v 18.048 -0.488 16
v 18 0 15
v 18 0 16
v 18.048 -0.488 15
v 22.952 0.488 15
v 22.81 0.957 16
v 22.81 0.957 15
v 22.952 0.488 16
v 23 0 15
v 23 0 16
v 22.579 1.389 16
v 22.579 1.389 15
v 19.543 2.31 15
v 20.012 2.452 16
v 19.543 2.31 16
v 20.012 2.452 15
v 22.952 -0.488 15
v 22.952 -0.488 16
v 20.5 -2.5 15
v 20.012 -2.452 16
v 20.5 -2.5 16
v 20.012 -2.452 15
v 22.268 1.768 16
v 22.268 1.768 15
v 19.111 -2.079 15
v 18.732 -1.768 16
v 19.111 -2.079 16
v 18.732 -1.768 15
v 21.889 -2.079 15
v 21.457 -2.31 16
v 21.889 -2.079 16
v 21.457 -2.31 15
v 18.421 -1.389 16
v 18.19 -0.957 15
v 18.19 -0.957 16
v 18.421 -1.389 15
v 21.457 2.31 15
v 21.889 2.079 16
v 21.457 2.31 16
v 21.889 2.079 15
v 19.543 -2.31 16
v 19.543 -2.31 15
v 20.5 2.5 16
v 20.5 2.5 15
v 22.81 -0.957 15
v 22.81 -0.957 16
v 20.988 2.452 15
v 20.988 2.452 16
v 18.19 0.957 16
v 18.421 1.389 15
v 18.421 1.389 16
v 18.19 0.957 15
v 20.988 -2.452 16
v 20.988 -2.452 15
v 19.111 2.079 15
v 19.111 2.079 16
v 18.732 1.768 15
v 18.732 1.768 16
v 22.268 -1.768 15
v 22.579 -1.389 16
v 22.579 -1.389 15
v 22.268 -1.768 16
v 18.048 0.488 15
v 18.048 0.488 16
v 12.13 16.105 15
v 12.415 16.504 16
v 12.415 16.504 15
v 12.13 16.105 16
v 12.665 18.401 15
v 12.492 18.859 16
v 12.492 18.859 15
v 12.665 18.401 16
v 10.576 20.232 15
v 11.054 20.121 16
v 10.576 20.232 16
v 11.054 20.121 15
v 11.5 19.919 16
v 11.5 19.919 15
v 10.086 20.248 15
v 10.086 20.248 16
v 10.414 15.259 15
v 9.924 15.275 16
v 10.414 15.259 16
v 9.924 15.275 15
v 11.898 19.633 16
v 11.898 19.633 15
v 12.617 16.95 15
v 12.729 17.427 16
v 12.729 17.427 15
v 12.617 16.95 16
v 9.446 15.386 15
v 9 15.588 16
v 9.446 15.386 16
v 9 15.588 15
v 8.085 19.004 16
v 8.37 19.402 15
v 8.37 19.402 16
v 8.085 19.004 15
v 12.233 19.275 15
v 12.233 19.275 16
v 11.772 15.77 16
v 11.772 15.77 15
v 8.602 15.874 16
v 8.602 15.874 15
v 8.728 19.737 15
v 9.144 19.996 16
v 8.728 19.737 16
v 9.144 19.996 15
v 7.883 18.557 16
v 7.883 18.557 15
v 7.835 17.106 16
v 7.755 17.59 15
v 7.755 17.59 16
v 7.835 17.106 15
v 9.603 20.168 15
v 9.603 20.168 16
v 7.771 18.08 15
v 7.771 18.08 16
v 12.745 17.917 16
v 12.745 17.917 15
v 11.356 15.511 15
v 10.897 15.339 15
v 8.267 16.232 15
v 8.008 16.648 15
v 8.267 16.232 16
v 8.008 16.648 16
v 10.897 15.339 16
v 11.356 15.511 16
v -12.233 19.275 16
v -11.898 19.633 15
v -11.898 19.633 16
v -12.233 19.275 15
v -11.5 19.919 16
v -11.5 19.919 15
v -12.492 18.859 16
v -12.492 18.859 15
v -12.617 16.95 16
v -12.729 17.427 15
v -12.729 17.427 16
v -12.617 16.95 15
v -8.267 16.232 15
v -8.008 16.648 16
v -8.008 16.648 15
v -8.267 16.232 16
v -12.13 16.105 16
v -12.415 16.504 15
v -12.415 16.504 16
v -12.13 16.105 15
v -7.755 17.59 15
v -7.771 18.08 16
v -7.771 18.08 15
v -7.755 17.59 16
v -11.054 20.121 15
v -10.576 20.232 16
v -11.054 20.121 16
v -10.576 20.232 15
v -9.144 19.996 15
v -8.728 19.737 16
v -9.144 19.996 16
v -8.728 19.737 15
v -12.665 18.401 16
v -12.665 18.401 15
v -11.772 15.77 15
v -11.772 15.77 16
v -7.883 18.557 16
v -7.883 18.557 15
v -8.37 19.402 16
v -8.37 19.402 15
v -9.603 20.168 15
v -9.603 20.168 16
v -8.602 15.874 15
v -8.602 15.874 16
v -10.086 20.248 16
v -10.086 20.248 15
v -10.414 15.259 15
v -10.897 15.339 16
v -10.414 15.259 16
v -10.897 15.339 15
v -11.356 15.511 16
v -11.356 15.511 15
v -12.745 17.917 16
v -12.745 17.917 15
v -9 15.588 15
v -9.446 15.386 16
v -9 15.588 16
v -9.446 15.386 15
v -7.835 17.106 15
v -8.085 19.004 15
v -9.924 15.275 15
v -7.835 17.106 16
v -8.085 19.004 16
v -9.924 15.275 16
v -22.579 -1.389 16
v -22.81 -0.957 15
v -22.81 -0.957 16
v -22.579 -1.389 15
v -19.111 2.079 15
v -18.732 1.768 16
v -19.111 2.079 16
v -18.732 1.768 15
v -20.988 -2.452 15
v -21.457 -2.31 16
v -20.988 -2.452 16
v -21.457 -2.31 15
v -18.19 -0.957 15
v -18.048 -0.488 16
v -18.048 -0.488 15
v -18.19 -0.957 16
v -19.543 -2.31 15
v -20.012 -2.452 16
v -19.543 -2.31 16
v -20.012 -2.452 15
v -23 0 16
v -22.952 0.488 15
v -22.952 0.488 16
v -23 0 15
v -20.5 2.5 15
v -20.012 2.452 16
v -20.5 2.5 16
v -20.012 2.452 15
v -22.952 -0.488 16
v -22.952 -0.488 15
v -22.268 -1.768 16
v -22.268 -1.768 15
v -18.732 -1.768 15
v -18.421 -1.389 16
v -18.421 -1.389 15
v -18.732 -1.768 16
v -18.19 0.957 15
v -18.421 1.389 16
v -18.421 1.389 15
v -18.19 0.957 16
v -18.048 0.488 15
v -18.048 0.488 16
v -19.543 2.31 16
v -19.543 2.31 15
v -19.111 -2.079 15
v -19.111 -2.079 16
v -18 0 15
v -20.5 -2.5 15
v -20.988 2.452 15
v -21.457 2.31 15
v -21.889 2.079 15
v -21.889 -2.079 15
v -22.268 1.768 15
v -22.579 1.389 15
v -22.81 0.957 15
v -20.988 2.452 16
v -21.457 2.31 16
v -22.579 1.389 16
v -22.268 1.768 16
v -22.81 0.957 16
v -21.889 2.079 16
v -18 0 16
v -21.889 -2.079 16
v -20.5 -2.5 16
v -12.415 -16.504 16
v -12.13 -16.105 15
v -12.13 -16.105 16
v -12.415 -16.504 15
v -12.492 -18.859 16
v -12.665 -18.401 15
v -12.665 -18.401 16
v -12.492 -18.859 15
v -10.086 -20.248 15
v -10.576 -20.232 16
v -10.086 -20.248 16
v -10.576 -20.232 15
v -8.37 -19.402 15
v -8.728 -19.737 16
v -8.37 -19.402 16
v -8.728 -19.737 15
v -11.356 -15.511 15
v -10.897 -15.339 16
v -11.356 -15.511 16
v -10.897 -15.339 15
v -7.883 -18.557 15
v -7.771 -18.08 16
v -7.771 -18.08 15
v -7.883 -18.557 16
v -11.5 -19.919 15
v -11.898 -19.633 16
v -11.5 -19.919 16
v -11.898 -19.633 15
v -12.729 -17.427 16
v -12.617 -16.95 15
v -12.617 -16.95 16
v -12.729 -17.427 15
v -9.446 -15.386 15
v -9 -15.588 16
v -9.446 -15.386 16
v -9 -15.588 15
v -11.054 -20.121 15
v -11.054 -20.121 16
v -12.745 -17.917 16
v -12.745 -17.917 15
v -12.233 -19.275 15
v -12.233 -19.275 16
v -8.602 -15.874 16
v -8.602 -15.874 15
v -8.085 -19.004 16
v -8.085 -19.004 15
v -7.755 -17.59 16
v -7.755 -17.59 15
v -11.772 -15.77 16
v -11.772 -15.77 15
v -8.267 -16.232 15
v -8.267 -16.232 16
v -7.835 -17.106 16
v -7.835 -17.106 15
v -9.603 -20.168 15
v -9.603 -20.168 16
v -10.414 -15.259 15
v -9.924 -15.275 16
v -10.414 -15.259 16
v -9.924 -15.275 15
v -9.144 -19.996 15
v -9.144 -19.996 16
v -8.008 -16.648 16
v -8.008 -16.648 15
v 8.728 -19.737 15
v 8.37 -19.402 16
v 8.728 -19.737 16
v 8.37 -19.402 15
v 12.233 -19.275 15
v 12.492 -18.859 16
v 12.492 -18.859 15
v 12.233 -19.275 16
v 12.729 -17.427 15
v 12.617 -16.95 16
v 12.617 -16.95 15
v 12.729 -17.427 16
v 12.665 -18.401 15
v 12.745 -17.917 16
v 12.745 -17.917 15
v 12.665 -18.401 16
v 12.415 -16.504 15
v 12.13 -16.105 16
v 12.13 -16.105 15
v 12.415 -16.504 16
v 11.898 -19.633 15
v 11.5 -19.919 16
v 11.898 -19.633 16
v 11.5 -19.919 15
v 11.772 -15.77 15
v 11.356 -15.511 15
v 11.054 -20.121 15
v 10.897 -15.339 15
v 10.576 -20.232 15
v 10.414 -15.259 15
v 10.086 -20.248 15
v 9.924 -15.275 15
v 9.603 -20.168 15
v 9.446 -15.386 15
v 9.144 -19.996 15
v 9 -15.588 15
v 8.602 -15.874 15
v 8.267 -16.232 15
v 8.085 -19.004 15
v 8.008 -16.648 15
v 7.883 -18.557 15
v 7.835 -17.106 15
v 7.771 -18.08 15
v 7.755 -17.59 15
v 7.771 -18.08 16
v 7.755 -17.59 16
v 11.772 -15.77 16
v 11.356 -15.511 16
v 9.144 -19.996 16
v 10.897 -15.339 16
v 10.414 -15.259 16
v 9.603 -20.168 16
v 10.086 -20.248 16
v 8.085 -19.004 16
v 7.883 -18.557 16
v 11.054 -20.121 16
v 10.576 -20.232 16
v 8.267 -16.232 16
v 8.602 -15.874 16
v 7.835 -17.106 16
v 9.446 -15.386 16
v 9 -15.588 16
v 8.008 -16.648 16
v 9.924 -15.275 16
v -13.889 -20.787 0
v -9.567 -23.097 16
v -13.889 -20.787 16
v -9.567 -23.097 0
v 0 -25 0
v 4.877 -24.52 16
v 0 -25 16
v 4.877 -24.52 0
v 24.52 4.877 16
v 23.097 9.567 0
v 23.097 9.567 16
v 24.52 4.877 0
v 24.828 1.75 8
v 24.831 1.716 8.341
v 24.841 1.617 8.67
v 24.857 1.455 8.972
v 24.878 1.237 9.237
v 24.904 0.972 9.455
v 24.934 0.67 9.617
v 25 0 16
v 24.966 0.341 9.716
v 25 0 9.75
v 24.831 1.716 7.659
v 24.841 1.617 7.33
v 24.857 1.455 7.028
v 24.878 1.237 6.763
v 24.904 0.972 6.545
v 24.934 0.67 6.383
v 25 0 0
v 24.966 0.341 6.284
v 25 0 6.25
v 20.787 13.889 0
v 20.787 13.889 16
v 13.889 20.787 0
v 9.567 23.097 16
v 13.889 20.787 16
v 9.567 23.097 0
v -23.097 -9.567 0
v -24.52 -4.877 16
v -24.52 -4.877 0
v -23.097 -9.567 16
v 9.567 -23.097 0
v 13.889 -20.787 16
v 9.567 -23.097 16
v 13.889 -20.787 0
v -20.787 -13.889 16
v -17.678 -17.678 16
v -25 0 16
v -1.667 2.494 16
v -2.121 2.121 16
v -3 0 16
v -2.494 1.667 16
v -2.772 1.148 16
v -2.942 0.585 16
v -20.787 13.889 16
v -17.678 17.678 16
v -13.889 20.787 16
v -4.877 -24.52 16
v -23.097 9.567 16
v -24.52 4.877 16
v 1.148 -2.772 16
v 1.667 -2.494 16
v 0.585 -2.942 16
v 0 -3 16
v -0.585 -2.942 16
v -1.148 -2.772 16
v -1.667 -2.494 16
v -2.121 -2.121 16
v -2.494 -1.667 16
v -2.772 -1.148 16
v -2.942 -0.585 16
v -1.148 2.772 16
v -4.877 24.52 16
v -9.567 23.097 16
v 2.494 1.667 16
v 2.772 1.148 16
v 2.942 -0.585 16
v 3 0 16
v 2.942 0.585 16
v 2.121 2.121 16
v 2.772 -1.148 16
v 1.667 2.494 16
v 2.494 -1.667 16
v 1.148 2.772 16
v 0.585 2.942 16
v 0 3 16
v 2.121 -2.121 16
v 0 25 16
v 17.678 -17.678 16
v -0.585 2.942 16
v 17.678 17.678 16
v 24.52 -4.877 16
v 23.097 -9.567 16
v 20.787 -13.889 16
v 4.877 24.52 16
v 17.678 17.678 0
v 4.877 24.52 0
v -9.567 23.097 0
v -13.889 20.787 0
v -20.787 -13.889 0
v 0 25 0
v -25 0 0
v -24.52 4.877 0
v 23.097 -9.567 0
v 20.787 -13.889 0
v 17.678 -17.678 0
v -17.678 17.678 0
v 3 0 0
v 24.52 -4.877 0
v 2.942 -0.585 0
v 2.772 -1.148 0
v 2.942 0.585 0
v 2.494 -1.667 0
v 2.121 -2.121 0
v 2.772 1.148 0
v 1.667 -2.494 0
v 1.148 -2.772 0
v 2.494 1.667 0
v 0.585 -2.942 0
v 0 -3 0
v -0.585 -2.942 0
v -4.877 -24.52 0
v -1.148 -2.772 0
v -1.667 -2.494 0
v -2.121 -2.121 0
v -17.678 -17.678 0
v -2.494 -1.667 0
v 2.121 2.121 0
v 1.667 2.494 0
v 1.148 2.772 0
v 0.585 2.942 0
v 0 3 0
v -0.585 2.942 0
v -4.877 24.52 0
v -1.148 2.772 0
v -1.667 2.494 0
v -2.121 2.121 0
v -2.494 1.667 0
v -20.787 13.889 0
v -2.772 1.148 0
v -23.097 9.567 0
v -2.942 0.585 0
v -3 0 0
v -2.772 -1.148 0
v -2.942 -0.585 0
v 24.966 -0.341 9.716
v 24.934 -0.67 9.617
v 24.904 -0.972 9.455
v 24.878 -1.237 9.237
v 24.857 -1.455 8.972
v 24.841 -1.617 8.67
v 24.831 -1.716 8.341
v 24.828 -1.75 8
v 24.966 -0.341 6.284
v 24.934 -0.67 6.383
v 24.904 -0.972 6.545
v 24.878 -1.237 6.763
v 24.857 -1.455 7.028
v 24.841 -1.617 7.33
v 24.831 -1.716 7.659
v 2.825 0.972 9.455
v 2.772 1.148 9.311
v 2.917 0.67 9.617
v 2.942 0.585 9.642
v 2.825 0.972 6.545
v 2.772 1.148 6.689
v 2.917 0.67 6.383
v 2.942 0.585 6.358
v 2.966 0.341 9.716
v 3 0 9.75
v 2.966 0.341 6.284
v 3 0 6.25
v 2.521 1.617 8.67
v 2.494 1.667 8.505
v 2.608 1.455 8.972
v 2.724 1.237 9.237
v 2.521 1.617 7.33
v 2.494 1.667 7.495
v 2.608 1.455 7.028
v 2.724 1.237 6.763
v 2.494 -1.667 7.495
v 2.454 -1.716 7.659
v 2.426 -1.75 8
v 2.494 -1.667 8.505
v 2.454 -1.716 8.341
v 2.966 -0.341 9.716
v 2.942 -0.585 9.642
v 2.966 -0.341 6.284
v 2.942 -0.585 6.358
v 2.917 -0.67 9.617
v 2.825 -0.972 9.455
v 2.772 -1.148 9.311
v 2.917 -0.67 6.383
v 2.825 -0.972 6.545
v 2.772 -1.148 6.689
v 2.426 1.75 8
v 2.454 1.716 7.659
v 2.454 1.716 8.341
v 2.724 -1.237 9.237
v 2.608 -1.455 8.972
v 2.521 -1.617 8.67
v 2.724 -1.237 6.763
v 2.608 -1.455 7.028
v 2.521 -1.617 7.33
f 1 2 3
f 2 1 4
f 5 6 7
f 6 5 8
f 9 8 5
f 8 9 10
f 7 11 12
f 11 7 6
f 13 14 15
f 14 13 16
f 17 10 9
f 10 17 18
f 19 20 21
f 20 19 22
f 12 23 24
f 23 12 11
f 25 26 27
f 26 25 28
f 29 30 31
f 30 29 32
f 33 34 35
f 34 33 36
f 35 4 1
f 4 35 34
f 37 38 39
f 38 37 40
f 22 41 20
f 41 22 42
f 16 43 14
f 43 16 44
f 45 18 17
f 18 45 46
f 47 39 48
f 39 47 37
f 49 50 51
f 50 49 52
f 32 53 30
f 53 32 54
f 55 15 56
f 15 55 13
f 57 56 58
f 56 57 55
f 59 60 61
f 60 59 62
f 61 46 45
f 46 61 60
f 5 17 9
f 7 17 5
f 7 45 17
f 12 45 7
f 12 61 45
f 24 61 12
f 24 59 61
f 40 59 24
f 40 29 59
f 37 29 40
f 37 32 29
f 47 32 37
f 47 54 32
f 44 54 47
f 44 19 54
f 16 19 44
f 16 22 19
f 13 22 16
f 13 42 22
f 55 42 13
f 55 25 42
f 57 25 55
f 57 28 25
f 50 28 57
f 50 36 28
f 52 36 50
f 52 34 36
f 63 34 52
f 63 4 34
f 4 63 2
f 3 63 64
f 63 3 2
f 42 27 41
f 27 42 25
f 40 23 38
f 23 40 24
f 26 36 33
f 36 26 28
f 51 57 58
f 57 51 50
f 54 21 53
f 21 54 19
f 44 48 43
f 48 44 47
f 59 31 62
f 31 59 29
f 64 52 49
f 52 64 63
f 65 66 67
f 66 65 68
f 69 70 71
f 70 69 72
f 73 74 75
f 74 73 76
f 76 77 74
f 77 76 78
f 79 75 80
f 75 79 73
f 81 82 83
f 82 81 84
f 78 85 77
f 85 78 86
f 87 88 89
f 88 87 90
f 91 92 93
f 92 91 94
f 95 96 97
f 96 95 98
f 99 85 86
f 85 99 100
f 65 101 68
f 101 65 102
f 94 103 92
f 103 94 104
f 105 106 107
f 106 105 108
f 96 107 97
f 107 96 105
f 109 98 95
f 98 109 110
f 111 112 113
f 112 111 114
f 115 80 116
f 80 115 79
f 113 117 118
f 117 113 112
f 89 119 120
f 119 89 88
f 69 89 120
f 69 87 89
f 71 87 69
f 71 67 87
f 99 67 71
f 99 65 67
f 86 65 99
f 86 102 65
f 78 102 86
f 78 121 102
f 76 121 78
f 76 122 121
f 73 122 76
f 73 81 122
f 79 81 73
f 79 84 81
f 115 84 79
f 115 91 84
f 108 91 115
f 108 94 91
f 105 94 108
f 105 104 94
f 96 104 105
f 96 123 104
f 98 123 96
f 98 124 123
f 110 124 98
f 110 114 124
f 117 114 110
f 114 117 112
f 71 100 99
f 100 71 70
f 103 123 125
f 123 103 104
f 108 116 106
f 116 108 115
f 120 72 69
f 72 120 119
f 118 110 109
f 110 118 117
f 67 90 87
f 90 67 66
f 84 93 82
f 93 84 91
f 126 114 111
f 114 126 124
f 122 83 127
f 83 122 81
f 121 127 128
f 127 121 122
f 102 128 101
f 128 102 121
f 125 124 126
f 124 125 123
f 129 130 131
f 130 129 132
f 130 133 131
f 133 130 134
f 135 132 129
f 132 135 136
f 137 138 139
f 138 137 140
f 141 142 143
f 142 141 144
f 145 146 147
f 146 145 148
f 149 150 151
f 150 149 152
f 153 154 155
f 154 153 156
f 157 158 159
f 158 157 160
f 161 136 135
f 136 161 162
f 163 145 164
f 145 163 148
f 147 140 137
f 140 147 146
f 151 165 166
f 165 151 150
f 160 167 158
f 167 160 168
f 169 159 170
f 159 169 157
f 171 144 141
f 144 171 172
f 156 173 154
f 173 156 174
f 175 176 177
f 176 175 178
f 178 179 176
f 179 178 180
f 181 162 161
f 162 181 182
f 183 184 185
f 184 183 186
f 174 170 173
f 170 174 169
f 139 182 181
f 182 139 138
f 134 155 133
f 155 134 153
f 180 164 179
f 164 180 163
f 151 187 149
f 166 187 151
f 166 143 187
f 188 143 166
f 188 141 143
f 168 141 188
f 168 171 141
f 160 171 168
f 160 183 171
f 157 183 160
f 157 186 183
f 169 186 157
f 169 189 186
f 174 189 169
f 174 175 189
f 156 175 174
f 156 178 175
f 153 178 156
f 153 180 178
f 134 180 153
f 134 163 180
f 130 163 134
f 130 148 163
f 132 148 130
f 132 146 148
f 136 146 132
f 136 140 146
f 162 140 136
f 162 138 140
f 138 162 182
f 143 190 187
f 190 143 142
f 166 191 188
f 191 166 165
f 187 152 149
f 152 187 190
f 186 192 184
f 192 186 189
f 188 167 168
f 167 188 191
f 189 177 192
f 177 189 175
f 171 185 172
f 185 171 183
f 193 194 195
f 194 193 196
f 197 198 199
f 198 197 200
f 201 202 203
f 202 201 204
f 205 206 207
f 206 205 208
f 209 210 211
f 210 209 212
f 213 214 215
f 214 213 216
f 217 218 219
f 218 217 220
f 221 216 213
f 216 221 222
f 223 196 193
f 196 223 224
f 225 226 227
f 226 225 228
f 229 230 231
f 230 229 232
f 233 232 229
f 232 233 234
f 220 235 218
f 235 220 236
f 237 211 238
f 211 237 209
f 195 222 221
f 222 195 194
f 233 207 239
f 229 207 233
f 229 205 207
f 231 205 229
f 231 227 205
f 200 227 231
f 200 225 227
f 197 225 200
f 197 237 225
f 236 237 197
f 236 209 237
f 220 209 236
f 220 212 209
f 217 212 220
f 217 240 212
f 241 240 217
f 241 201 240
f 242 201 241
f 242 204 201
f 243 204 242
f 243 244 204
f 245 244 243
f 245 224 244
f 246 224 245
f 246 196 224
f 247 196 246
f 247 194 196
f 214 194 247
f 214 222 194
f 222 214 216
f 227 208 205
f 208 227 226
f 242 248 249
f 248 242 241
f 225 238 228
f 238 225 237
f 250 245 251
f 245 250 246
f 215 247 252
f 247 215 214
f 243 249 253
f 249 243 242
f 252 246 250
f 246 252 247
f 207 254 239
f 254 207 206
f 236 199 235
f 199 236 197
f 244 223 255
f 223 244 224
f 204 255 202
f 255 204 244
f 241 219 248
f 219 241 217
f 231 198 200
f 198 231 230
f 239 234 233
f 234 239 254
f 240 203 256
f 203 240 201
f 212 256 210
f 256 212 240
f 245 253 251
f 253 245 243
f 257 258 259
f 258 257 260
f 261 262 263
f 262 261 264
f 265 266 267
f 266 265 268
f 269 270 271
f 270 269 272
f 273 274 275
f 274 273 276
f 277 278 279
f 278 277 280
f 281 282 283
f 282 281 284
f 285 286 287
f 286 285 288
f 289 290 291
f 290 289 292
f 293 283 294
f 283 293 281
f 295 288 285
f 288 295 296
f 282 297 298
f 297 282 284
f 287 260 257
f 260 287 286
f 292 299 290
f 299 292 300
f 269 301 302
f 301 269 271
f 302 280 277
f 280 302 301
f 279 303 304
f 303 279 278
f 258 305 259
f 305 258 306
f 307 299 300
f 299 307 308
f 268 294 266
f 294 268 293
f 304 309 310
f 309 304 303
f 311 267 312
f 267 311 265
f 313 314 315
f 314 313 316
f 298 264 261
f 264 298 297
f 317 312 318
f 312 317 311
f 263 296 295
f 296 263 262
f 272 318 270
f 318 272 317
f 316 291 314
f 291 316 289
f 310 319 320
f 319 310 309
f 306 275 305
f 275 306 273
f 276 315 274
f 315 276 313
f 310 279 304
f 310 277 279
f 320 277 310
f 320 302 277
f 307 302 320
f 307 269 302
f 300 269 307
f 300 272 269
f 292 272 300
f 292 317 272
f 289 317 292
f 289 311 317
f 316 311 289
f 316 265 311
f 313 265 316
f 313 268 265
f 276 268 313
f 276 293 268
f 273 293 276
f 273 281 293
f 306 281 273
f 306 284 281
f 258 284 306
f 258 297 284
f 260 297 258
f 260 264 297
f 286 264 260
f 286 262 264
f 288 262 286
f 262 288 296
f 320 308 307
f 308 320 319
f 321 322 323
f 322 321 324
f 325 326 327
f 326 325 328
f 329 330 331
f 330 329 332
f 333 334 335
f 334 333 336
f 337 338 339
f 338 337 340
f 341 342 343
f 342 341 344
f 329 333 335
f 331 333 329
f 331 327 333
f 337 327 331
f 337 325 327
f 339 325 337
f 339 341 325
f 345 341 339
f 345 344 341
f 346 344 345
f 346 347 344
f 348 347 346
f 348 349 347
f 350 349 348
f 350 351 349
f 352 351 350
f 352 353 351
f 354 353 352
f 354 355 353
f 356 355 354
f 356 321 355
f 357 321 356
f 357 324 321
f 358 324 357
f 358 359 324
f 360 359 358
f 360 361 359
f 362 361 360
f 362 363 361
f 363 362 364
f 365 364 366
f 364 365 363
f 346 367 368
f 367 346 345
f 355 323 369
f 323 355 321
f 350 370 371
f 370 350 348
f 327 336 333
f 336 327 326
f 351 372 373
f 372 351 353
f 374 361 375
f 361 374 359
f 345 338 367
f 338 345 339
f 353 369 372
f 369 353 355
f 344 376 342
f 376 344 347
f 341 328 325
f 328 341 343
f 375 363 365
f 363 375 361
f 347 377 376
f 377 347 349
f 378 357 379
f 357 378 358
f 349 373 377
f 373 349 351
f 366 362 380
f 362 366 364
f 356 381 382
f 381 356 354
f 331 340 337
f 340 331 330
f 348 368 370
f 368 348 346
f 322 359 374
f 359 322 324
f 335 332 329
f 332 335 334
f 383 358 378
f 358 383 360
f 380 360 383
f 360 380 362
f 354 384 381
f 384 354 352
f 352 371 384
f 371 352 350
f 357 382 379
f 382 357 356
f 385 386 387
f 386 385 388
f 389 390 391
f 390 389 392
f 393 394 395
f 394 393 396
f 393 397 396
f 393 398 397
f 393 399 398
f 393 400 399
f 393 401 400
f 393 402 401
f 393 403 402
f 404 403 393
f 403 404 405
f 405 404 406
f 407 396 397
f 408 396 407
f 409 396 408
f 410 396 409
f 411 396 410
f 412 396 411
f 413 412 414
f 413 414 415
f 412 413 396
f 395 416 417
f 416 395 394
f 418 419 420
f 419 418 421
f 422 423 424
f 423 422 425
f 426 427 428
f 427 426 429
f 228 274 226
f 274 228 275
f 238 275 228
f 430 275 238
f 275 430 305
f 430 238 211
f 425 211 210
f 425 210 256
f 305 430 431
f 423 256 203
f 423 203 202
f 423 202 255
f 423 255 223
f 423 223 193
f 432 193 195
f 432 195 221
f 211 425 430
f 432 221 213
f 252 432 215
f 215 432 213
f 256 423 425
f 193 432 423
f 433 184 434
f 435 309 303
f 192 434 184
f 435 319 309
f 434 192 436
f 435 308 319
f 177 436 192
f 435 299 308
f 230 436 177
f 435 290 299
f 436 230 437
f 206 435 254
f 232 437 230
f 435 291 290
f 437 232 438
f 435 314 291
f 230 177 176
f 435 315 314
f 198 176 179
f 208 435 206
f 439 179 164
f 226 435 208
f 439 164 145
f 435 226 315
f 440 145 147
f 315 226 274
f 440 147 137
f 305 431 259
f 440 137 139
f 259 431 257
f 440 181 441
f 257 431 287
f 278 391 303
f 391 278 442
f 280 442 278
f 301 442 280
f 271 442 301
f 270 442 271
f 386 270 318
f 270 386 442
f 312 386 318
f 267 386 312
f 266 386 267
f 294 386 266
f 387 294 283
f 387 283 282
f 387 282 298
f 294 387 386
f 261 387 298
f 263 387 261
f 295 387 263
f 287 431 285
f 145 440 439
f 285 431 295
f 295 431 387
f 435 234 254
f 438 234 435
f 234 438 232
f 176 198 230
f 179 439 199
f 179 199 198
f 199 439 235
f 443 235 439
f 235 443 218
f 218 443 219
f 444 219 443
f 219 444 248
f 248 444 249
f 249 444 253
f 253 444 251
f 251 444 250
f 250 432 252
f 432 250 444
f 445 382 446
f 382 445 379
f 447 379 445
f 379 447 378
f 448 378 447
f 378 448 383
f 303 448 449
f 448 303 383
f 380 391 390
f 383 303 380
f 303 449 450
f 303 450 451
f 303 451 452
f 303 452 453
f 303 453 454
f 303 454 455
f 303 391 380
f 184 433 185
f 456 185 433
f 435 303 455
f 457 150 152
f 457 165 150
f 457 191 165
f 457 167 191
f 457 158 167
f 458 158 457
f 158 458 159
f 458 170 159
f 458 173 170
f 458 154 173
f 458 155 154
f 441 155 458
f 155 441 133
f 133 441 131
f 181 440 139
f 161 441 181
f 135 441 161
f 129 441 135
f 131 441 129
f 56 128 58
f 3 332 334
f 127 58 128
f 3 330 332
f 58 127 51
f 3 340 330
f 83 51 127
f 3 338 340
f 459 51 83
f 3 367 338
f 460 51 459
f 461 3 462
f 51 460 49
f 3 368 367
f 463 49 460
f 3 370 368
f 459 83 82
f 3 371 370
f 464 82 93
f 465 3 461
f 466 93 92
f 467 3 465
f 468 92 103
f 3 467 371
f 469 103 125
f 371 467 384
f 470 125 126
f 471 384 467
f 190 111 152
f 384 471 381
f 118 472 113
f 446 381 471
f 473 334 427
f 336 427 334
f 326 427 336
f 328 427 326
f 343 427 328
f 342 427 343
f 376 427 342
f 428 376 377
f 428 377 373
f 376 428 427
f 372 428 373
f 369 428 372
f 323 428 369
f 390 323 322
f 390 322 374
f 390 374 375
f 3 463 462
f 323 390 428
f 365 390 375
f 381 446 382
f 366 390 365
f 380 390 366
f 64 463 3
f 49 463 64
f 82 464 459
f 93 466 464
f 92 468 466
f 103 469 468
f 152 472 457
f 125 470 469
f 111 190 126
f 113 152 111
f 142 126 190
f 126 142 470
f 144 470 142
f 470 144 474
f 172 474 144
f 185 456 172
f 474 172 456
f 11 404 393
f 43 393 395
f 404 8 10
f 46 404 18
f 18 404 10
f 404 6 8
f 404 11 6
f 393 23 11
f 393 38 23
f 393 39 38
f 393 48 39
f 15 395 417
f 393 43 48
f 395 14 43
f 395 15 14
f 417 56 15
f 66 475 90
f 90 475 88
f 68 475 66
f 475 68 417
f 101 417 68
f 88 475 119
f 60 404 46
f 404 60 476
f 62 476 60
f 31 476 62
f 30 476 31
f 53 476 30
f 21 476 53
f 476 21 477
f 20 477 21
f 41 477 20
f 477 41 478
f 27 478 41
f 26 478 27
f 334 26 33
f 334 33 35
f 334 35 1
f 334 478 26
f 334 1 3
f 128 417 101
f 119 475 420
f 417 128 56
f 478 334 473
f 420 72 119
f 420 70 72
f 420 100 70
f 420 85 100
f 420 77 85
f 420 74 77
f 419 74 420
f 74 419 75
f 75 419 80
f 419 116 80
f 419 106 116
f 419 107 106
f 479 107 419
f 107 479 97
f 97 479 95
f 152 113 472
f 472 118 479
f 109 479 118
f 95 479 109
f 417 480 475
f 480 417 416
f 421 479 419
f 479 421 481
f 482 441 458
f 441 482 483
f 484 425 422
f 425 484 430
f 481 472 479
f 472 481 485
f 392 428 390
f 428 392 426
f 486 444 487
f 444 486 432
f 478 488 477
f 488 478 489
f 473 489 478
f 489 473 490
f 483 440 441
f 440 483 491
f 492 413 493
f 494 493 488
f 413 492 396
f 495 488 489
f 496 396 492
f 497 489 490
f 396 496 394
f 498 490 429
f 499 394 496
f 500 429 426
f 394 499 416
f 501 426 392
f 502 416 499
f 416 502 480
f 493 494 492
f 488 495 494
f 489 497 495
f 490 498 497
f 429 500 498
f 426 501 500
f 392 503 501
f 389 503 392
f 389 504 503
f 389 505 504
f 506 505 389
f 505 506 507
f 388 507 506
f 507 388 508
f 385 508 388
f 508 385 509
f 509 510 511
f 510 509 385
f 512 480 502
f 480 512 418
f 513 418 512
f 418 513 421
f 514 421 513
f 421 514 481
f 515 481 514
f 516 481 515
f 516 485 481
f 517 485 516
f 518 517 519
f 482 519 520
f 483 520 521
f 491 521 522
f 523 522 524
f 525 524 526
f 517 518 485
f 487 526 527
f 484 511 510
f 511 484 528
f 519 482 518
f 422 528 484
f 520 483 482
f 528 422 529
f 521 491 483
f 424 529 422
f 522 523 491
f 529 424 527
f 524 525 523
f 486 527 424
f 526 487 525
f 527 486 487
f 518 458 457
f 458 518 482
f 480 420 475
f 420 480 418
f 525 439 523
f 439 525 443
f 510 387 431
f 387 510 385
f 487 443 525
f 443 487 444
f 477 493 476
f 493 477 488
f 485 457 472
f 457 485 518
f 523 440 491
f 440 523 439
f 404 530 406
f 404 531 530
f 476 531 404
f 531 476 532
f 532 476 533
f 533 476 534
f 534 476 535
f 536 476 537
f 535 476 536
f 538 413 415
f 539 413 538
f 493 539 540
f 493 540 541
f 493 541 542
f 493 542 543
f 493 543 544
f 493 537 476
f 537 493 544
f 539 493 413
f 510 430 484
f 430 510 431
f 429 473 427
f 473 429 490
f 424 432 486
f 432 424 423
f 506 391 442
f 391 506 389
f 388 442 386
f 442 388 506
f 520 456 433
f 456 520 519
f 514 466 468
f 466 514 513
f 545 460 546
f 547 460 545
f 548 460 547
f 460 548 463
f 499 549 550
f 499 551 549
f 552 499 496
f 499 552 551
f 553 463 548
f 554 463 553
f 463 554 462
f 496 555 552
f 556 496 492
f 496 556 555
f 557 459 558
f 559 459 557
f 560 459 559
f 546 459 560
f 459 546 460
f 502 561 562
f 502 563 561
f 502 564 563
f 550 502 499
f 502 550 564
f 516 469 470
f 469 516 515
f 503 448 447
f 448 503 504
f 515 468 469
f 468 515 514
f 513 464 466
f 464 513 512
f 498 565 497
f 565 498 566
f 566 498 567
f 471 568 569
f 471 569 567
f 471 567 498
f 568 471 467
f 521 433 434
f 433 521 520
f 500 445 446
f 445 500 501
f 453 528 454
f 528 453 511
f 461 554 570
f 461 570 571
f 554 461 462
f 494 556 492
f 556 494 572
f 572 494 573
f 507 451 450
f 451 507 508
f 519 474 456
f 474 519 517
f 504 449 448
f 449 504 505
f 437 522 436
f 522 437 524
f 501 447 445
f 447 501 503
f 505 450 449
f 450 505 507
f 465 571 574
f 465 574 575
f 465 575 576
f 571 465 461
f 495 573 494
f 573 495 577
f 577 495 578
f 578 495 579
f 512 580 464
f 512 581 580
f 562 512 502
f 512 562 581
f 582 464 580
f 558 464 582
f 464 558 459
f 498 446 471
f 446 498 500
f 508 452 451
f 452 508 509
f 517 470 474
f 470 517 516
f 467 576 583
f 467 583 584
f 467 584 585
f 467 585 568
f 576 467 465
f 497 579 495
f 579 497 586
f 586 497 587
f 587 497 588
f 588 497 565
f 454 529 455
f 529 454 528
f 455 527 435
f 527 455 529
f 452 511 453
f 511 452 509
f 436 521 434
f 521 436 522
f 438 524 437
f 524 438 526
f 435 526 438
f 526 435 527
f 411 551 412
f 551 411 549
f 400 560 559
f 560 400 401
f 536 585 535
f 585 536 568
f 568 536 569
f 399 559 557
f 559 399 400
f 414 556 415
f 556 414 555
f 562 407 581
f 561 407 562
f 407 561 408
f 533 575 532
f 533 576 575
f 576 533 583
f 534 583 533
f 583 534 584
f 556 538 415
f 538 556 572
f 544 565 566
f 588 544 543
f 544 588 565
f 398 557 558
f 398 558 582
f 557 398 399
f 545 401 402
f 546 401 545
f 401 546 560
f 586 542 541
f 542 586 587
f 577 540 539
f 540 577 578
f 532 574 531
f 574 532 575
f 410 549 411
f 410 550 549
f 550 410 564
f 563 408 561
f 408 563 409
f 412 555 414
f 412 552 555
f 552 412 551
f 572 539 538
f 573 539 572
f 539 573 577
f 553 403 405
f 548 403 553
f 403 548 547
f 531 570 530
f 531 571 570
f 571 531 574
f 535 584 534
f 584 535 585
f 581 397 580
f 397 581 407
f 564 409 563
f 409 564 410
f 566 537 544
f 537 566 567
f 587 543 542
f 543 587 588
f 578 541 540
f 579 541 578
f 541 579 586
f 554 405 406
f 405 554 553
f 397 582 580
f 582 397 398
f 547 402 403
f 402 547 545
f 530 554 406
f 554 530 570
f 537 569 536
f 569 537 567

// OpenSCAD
$fn = 32;

// ----------------------------------------------------------------------
// Control knob: dimpled knob
// ----------------------------------------------------------------------

// --- parameters (mm) ---
dimp_d = 5;               // finger dimple diameter
n_dimp = 6;               // number of dimples
dimp_r = 20.5;            // dimple ring radius
knob_d = 50;              // knob body diameter
knob_h = 16;              // knob body height
bore_d = 6;               // shaft bore diameter
set_d = 3.5;              // set screw bore diameter

dimp_step = 360 / n_dimp;  // dimple angular step

difference() {
  cylinder(h = knob_h, d = knob_d);
  translate([0, 0, -1]) cylinder(h = knob_h + 2, d = bore_d);
  translate([-1, 0, knob_h / 2]) rotate([0, 90, 0])
    cylinder(h = knob_d / 2 + bore_d / 2 + 2, d = set_d);  for (i = [0 : n_dimp - 1])
    rotate([0, 0, i * dimp_step])
      translate([dimp_r, 0, knob_h - 1])
        cylinder(h = 2, d = dimp_d);
}
